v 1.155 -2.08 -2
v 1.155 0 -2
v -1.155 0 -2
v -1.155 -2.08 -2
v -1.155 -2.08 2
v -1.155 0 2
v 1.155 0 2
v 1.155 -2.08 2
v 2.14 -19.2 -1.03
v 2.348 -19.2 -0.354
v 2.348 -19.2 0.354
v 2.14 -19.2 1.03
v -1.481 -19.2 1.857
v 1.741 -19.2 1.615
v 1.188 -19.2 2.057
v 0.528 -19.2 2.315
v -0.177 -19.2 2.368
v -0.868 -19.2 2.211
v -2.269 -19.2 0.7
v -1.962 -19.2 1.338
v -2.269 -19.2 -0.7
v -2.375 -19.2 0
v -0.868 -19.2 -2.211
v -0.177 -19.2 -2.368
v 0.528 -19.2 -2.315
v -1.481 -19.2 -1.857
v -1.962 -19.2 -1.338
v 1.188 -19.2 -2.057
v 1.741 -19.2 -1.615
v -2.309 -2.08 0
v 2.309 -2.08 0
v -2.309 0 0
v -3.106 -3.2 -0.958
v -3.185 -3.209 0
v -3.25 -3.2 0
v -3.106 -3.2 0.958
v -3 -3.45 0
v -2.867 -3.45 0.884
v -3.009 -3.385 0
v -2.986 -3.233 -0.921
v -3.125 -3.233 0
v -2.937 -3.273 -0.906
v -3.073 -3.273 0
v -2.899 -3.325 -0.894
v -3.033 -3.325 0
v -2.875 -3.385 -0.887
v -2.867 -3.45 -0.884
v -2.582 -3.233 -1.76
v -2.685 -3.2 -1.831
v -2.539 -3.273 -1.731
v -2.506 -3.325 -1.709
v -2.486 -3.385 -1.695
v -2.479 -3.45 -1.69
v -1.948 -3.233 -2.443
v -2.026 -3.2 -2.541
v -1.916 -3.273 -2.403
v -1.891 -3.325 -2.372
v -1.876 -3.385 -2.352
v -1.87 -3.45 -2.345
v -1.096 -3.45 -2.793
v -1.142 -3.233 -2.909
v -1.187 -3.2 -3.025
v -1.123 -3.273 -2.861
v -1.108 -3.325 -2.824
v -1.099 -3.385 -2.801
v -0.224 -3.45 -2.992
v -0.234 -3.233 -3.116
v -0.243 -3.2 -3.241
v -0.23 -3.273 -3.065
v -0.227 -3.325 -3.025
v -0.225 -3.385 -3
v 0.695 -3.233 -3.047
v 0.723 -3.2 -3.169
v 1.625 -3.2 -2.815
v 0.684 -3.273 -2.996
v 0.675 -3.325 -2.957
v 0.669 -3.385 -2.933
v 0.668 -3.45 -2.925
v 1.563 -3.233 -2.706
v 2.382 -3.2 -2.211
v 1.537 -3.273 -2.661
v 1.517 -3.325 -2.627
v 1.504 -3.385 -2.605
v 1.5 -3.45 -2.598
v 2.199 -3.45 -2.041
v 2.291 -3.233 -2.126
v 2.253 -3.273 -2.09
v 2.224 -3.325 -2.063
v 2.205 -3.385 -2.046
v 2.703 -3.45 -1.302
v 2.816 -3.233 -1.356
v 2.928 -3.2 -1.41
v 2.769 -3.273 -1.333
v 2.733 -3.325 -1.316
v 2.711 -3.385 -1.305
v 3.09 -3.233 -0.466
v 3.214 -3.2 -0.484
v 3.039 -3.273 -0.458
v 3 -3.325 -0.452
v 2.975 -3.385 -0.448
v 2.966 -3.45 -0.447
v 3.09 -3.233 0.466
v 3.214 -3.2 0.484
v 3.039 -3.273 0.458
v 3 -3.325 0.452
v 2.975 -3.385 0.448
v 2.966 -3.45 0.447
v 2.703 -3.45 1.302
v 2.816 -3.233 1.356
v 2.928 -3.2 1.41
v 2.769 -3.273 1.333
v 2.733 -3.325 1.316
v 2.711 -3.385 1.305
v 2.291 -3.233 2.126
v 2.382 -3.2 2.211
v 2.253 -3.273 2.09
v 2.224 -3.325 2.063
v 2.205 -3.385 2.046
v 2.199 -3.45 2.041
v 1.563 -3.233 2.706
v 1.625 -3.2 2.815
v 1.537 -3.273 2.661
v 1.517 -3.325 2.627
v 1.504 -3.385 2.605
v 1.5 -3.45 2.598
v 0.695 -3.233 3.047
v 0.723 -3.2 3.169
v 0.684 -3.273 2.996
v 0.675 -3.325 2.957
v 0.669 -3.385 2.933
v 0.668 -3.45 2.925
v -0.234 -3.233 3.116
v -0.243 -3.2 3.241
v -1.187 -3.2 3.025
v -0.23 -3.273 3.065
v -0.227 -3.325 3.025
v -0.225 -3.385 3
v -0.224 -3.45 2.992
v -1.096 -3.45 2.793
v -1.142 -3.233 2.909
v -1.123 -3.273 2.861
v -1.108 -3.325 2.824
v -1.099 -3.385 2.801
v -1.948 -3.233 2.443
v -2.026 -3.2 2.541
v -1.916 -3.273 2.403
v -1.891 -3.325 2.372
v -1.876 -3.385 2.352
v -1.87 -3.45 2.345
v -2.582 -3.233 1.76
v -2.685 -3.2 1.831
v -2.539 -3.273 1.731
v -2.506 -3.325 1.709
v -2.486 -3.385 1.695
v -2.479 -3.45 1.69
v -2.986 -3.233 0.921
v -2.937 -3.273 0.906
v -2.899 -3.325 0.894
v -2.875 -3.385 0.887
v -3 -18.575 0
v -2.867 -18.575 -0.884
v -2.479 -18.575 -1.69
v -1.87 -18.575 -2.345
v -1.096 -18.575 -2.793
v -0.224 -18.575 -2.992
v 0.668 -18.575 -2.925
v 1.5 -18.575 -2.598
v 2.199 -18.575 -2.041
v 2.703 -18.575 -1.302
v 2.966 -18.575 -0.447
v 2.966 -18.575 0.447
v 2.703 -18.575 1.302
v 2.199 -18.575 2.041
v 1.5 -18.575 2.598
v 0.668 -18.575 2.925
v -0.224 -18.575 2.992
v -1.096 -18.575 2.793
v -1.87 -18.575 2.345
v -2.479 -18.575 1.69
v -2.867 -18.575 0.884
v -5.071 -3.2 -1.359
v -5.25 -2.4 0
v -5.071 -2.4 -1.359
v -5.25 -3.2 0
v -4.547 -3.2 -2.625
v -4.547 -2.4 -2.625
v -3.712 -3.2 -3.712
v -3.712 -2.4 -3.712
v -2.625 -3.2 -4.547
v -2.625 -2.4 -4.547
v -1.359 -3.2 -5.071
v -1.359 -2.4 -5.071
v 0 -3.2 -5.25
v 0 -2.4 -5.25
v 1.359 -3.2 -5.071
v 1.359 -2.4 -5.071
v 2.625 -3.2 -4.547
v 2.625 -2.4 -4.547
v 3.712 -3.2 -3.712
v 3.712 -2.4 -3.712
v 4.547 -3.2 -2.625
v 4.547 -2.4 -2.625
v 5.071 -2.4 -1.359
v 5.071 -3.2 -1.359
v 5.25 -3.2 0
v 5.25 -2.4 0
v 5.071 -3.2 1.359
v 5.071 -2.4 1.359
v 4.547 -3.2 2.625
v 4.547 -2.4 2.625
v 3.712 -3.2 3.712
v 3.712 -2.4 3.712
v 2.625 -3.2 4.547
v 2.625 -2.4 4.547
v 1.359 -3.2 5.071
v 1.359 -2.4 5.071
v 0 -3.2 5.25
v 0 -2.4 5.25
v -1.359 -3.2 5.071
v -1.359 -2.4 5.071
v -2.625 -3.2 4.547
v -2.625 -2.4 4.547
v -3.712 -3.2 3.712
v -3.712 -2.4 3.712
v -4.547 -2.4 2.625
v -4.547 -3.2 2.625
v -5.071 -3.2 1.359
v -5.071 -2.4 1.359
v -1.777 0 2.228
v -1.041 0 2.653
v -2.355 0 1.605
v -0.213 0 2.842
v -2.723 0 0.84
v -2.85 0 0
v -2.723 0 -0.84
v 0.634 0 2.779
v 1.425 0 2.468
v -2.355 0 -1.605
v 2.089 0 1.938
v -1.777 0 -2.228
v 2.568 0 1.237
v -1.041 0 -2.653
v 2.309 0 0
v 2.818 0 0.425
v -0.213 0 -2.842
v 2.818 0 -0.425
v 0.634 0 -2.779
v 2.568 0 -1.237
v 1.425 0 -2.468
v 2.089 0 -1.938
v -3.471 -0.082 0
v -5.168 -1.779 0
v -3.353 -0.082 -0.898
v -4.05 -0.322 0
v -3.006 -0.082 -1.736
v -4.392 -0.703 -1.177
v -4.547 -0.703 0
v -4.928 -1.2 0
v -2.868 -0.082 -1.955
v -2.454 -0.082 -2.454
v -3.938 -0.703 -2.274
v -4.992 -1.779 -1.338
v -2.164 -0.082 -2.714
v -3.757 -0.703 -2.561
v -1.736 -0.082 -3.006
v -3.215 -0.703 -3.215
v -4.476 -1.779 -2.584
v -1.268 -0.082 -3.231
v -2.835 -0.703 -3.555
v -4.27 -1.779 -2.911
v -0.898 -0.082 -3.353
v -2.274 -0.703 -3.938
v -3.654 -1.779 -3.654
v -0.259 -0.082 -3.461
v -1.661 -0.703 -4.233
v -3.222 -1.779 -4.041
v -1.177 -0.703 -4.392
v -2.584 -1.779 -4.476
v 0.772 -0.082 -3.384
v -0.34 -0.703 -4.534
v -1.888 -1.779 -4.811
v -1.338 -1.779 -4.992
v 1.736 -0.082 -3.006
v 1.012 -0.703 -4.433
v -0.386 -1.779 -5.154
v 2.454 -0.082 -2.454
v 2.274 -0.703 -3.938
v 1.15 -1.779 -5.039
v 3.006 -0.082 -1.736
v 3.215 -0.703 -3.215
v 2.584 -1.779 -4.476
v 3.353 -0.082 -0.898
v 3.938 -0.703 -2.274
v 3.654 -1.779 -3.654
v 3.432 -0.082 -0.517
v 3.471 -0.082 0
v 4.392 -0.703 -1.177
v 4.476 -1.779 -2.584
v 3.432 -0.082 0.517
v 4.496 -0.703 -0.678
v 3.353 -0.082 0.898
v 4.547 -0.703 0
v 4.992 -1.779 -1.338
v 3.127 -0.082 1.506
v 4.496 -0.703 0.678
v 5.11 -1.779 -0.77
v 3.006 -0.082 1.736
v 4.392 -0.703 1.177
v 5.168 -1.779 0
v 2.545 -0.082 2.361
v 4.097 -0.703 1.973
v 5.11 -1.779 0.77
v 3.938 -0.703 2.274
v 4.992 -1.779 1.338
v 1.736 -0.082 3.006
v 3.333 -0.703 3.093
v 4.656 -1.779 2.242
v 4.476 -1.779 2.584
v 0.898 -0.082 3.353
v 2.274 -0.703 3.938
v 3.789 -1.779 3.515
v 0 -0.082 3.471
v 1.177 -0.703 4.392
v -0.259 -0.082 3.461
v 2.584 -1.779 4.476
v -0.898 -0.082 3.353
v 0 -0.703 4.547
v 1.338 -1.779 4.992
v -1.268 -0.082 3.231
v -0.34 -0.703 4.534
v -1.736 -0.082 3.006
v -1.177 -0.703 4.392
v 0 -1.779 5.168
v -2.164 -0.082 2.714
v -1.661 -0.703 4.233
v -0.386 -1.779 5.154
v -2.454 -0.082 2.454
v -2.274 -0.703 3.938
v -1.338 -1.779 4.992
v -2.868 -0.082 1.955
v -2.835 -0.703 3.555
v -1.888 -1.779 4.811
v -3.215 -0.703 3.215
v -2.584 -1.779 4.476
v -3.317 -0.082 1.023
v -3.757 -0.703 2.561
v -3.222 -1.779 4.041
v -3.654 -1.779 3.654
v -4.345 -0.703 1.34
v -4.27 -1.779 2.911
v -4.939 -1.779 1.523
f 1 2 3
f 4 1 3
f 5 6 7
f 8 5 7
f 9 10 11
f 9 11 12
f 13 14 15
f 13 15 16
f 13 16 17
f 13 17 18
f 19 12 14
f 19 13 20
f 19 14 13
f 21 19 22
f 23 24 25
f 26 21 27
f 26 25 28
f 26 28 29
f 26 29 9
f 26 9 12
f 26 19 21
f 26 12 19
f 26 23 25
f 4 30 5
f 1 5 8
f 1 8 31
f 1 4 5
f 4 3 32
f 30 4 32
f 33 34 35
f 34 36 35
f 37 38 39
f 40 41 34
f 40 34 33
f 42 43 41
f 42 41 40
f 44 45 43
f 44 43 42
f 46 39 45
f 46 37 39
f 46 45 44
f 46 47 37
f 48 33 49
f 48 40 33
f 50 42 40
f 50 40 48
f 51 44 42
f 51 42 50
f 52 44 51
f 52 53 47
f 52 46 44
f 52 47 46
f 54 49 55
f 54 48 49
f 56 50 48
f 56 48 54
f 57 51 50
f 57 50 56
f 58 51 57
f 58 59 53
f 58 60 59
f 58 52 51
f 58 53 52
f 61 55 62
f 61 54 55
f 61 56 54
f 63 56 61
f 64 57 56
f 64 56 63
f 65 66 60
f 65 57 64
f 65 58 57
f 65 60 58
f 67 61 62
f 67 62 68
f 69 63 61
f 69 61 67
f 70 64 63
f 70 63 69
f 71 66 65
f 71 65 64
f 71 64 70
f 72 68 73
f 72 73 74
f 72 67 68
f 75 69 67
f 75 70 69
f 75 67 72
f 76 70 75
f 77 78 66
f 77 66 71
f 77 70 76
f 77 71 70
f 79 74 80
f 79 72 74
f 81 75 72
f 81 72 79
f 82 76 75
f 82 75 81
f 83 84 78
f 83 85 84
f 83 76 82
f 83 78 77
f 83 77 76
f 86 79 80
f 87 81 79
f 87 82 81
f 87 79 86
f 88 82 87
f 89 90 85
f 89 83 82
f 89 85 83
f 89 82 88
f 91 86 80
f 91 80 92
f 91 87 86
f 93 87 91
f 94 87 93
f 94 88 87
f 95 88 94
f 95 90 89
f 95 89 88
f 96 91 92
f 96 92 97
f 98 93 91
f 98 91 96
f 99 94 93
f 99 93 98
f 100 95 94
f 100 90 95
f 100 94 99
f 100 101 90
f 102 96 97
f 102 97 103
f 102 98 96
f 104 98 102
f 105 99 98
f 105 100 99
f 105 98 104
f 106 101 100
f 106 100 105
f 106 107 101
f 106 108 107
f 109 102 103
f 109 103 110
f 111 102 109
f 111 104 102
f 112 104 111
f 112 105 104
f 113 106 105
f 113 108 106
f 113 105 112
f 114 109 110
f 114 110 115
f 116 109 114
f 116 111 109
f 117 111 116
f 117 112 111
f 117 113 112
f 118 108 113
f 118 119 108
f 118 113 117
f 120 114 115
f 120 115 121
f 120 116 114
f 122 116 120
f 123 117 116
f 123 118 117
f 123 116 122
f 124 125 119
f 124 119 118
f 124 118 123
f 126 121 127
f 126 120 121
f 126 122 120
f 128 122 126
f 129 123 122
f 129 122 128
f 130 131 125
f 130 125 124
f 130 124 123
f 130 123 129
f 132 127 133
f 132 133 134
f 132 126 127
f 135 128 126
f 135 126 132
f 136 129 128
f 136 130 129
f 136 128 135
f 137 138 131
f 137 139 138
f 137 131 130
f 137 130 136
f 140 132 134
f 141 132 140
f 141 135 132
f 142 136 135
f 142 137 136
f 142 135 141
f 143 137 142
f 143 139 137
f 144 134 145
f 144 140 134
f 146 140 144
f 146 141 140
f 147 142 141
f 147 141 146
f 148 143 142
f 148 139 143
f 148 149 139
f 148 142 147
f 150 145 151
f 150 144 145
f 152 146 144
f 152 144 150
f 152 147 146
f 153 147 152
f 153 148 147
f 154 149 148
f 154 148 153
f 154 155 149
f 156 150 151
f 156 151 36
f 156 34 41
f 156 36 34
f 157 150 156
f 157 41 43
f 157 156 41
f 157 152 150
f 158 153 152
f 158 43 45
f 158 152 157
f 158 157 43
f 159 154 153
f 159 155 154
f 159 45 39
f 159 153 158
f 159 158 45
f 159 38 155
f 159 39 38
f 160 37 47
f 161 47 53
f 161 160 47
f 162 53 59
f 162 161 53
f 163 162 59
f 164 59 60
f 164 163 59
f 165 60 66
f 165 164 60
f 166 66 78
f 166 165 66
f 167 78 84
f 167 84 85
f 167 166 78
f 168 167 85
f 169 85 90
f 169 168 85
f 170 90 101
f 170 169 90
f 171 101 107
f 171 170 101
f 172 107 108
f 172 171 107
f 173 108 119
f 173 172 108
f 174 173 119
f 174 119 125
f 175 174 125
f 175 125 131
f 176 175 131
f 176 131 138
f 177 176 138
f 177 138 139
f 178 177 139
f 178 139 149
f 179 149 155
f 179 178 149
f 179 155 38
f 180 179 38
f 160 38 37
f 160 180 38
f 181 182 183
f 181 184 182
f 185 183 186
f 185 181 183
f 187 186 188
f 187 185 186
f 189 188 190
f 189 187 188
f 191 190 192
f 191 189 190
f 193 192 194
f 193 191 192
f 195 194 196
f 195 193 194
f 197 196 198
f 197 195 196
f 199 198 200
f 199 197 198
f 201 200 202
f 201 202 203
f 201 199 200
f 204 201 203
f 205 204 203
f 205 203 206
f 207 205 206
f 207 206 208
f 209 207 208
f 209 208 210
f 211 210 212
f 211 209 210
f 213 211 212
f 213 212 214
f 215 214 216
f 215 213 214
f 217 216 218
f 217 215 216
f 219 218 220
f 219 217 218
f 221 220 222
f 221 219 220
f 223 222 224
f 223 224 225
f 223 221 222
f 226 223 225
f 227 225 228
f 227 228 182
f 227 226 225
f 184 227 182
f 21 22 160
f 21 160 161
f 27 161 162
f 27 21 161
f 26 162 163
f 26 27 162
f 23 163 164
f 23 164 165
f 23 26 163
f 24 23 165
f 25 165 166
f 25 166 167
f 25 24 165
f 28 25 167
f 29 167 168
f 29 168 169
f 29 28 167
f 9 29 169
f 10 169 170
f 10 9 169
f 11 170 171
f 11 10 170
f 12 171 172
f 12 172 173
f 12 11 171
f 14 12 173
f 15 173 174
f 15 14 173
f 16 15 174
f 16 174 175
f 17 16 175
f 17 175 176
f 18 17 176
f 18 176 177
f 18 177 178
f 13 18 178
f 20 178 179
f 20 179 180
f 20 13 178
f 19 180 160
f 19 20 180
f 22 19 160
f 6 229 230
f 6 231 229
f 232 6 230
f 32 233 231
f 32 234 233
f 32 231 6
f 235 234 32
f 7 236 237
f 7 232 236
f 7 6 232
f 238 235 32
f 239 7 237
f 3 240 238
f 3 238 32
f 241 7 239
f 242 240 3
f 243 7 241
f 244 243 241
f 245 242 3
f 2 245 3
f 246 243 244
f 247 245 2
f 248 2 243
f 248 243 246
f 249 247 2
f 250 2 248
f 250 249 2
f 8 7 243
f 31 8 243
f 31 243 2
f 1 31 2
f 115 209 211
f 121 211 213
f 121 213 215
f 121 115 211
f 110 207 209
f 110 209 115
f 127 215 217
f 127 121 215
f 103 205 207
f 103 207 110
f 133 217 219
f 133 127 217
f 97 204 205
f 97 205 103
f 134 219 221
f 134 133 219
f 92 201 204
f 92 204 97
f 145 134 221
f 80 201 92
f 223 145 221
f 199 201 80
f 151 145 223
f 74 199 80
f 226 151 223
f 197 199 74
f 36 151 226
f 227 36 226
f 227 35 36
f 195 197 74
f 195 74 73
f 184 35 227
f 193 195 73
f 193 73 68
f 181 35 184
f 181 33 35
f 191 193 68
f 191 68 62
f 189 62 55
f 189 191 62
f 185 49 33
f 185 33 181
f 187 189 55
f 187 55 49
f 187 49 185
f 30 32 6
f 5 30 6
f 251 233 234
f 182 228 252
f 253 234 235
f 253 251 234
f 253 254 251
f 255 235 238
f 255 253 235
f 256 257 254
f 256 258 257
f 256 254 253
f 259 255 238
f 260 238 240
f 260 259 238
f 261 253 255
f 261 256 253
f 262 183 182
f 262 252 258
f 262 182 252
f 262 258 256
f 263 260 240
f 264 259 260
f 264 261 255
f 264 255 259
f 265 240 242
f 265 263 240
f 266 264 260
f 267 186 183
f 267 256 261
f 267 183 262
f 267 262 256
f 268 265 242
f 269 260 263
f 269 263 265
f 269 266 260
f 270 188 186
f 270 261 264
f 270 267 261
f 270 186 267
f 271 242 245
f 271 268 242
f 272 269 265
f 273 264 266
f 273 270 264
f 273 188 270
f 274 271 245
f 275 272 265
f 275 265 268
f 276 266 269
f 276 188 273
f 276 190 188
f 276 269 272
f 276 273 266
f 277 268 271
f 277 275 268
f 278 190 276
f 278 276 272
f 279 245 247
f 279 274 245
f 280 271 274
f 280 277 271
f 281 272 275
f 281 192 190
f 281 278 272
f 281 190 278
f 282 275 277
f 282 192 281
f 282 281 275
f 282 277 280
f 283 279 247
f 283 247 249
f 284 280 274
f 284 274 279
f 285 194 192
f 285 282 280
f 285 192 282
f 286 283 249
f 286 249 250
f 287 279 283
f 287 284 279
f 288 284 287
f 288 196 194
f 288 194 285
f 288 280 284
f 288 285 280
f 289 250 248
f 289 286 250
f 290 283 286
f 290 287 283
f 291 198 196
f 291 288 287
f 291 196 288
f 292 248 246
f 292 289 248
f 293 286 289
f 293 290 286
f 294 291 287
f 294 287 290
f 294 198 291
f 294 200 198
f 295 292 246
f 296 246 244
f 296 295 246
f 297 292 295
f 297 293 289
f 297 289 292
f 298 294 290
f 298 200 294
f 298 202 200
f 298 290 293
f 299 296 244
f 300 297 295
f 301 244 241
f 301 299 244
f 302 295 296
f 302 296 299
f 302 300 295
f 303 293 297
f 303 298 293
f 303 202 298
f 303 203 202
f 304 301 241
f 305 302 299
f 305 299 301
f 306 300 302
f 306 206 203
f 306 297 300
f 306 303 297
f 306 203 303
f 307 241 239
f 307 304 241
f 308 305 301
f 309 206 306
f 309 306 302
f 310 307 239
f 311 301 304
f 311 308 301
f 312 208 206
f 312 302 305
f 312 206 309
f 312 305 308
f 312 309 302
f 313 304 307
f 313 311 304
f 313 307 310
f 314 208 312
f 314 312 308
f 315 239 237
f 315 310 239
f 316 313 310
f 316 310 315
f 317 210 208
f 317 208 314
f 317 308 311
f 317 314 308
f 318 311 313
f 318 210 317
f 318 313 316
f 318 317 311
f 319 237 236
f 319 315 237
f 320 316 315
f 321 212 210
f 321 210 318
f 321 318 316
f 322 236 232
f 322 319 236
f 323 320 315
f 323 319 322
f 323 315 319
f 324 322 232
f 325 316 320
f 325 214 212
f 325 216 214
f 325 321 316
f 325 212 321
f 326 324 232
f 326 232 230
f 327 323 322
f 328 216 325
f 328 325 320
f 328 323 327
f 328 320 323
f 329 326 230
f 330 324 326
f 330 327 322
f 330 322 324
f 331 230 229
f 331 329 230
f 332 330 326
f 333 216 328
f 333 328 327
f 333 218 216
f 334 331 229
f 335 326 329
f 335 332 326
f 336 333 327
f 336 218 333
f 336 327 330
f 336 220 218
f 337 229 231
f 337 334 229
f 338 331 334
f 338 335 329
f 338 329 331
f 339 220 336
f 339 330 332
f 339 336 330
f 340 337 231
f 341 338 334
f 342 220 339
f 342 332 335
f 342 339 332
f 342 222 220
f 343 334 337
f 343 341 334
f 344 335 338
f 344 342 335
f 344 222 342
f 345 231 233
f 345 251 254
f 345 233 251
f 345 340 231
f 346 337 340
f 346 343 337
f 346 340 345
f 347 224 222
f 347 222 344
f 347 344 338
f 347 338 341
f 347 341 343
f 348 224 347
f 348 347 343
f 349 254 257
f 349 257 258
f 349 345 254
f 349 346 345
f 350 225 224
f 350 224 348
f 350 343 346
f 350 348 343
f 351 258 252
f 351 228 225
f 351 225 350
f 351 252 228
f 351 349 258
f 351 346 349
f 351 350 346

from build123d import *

# Parameters (mm, degrees)
CUT_EXTRUDE1_DEPTH = 2.08
FILLET1_R          = 0.25
CHAMFER1_SIZE      = 0.625


with BuildPart() as part:
    # Sketch1 → Revolve1 (revolve)
    with BuildSketch(Plane.XY, mode=Mode.PRIVATE) as revolve1_sk:
        with BuildLine():
            Line((0, 0), (2.85, 0))
            ThreePointArc((2.85, 0), (4.547056275, -0.702943725), (5.25, -2.4))
            Line((5.25, -2.4), (5.25, -3.2))
            Line((5.25, -3.2), (3, -3.2))
            Line((3, -3.2), (3, -19.2))
            Line((3, -19.2), (0, -19.2))
            Line((0, -19.2), (0, 0))
        make_face()
    revolve(revolve1_sk.sketch.rotate(Axis((0, 5, 0), (0, -1, 0)), 180), axis=Axis((0, 5, 0), (0, -1, 0)))

    # Sketch2 → Cut-Extrude1 (cut)
    with BuildSketch(Plane(origin=(0, 0, 0), x_dir=(1, 0, 0), z_dir=(0, 1, 0))):
        Polygon((2.309401077, 0), (1.154700538, 2), (-1.154700538, 2), (-2.309401077, 0), (-1.154700538, -2), (1.154700538, -2), align=None)
    extrude(amount=-CUT_EXTRUDE1_DEPTH, mode=Mode.SUBTRACT)

    # Fillet1
    fillet1_edges = [part.edges().sort_by_distance(p)[0] for p in [
        (3, -3.2, 0),
    ]]
    fillet(fillet1_edges, radius=FILLET1_R)

    # Chamfer1
    chamfer1_edges = [part.edges().sort_by_distance(p)[0] for p in [
        (3, -19.2, 0),
    ]]
    chamfer(chamfer1_edges, length=CHAMFER1_SIZE)


solid = part.part
